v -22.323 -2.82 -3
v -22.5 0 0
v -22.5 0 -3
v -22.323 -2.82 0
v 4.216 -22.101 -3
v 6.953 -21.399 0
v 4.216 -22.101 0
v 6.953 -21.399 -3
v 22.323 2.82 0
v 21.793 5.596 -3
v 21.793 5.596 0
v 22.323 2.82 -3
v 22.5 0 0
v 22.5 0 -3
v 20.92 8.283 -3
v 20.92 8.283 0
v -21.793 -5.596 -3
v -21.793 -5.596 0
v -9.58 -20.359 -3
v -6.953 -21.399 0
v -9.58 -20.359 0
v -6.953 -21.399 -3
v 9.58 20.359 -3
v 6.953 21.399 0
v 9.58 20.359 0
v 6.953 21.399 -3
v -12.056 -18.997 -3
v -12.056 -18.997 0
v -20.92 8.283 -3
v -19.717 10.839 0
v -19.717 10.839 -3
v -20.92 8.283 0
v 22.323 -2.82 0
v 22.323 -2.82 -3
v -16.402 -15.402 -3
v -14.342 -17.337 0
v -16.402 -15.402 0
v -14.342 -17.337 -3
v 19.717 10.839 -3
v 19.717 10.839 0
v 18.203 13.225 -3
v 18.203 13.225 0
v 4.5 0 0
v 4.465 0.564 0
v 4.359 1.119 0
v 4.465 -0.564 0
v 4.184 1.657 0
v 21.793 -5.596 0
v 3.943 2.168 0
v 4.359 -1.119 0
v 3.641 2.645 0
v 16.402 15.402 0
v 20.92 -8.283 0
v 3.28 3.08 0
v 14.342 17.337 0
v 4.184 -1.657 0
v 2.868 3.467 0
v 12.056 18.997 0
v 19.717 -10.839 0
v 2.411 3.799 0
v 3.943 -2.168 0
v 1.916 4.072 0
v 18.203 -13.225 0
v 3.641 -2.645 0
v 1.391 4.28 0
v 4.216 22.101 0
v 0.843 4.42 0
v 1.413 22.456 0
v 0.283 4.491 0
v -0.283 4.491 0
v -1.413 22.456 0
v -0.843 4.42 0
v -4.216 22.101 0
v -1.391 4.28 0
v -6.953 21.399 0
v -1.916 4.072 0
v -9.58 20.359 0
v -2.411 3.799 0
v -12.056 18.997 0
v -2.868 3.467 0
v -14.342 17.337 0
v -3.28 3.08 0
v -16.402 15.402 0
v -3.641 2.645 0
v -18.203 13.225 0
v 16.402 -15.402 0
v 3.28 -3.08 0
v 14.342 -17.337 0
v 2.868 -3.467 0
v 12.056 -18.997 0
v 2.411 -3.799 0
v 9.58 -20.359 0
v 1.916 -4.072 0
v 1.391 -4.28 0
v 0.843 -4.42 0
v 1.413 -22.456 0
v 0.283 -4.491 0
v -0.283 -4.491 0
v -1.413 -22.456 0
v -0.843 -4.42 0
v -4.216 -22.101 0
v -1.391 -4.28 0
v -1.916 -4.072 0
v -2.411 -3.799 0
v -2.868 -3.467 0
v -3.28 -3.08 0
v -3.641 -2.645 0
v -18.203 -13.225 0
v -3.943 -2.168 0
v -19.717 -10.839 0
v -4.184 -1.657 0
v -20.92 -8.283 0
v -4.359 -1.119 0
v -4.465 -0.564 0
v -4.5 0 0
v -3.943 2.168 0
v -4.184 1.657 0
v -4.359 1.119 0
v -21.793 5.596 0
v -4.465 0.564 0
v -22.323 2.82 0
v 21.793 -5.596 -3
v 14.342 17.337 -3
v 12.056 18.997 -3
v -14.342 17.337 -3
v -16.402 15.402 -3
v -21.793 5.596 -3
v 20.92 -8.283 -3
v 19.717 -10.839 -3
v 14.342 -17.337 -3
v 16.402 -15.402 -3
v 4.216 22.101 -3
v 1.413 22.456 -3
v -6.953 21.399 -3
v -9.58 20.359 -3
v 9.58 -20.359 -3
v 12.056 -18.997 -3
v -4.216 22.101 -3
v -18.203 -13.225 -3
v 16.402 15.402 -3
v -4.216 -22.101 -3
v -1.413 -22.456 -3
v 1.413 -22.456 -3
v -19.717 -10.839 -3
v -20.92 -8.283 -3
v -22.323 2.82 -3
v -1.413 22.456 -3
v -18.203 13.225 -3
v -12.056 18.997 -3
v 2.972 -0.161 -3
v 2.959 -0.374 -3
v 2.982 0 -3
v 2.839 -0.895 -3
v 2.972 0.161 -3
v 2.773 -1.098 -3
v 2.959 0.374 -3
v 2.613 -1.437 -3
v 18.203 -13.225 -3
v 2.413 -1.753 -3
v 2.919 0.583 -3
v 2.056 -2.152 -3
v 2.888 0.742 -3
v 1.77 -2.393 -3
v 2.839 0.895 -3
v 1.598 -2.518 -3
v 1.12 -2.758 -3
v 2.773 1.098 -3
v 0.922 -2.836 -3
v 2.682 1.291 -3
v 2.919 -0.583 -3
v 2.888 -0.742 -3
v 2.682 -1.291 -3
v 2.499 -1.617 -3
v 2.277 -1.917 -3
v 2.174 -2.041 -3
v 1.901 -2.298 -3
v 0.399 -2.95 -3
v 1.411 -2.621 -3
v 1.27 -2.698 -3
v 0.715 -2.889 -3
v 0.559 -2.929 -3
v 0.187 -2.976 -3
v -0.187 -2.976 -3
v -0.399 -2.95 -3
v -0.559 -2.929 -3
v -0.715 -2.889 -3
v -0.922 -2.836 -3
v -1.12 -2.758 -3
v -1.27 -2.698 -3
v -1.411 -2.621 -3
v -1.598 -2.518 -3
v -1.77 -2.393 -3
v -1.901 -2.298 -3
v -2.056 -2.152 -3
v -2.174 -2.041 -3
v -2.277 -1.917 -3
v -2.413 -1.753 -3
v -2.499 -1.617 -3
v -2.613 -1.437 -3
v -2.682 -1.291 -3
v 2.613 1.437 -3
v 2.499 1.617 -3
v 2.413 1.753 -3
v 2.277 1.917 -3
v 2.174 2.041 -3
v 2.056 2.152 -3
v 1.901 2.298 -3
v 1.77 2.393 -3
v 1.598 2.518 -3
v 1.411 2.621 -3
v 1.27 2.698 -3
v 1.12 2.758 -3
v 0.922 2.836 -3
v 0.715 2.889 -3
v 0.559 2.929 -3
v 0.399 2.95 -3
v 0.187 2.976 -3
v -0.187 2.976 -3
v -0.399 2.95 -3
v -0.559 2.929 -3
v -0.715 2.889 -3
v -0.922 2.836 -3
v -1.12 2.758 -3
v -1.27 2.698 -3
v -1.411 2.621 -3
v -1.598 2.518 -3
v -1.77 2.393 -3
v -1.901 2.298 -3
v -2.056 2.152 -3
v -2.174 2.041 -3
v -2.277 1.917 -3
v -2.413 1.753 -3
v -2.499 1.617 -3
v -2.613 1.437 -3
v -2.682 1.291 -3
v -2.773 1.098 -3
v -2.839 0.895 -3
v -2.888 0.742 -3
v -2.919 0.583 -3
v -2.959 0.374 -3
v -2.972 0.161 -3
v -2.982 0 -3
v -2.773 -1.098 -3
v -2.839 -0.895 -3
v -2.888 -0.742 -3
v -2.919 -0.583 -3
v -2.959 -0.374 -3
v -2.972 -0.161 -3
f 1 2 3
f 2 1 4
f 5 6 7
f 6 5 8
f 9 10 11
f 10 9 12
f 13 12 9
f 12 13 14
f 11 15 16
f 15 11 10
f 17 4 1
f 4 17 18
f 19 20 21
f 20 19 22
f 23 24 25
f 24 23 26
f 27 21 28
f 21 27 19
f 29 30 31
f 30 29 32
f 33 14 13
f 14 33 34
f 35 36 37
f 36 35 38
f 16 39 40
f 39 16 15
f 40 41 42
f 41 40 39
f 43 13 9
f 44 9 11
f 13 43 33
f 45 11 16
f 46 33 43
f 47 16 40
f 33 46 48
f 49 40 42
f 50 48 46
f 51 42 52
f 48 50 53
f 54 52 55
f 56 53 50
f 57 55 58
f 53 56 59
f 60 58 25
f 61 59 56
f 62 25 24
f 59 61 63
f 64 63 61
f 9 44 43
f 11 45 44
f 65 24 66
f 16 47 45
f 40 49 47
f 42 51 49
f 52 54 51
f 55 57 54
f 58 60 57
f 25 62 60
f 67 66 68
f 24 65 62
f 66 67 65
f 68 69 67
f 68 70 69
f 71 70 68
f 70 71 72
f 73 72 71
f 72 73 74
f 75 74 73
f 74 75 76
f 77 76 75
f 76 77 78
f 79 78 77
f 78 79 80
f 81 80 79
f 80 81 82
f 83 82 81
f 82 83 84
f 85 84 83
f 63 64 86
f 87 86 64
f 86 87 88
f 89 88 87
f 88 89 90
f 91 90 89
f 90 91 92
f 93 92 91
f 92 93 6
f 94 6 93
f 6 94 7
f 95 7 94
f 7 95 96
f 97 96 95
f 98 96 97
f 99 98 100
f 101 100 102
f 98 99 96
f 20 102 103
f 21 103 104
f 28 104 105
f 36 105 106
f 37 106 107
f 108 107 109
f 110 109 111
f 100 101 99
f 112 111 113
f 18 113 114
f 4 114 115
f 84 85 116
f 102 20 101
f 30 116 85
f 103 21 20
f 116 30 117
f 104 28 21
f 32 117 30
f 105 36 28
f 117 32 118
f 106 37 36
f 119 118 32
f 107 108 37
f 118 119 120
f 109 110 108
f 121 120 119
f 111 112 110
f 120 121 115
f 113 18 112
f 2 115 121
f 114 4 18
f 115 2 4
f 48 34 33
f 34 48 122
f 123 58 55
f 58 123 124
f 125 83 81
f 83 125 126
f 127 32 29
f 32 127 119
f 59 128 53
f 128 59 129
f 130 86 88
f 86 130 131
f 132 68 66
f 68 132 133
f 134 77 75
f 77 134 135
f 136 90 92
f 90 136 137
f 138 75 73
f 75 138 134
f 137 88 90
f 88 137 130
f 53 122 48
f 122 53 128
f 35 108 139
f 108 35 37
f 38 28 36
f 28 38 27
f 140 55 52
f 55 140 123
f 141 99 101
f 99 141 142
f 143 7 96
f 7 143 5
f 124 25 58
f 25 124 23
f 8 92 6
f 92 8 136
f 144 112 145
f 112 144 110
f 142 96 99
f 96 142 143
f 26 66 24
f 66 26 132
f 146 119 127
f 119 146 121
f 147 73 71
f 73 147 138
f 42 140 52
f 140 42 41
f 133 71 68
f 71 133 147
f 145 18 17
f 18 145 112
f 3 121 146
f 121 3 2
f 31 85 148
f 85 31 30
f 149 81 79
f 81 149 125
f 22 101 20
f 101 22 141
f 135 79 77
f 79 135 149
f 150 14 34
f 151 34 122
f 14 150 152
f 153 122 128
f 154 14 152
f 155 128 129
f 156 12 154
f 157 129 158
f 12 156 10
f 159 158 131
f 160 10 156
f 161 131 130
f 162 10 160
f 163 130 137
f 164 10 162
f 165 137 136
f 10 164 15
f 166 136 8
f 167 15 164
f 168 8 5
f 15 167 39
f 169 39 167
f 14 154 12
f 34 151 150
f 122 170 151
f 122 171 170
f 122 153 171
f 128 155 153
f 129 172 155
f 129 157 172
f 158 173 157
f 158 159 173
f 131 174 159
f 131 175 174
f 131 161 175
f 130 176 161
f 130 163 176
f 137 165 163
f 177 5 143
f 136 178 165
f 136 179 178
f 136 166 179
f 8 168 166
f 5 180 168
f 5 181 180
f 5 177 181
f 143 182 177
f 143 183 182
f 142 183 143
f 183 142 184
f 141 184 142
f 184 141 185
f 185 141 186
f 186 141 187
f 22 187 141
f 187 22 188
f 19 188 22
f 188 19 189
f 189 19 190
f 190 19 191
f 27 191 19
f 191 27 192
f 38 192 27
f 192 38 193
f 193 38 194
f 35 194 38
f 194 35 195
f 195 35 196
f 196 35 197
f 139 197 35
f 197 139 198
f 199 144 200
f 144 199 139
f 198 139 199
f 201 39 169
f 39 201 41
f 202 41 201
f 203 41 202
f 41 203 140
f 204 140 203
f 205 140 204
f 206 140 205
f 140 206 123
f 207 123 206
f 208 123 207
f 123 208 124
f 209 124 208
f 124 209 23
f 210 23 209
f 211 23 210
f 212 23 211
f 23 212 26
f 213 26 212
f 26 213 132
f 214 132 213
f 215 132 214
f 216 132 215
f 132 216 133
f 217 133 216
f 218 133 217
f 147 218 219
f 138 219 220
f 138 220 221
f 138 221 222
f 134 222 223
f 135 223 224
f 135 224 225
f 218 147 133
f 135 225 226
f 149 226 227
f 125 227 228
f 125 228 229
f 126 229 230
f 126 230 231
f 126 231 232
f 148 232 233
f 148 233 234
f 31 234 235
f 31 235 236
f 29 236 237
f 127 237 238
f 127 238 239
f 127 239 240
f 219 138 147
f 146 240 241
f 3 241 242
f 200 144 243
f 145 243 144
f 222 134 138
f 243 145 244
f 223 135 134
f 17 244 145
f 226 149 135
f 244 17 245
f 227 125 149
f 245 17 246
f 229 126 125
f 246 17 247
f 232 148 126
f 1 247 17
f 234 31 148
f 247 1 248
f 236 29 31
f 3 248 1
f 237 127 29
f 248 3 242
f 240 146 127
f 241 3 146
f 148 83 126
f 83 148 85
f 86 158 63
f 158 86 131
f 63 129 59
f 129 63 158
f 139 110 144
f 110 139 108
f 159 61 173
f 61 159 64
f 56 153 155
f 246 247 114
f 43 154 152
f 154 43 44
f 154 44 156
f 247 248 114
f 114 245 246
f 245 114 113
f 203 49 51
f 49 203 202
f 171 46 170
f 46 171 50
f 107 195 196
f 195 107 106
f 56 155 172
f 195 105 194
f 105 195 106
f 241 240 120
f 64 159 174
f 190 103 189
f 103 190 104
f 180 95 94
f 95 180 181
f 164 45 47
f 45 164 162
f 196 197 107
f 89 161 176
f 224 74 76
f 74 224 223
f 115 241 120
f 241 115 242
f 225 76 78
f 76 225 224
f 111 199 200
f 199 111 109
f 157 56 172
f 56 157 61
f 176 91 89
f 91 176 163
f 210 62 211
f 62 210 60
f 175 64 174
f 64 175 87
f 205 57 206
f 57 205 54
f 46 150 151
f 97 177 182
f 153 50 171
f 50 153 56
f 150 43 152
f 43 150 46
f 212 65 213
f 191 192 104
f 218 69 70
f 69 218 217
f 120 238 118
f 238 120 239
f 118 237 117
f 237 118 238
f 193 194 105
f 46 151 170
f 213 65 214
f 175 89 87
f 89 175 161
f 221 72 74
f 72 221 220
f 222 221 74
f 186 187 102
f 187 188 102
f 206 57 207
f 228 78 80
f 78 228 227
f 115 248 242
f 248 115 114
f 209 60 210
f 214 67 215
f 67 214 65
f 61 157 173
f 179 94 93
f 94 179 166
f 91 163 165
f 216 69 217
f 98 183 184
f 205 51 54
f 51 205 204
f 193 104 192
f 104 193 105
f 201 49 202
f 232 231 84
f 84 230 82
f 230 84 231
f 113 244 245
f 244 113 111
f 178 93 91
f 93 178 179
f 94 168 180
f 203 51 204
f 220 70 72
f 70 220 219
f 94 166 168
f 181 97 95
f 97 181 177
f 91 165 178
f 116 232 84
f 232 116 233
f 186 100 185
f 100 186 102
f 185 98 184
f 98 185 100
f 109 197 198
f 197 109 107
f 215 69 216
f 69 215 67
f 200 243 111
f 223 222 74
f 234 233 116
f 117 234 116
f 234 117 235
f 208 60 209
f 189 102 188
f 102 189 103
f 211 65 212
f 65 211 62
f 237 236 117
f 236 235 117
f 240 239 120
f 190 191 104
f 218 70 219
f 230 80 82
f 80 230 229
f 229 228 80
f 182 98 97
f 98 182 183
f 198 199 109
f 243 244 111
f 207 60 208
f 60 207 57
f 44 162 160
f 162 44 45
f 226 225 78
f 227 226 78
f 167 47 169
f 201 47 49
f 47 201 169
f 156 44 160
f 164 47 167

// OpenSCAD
$fn = 50;


difference() {
	union() {
		translate(v = [0, 0, -3.0000000000]) {
			cylinder(h = 3, r = 22.5000000000);
		}
		translate(v = [0, 0, -3.0000000000]) {
			cylinder(h = 3, r = 2.8750000000);
		}
	}
	union() {
		translate(v = [0, 0, 0]) {
			rotate(a = [0, 0, 0]) {
				difference() {
					union() {
						translate(v = [0, 0, -3.0000000000]) {
							cylinder(h = 3, r = 2.2500000000);
						}
						translate(v = [0, 0, -4.2000000000]) {
							cylinder(h = 4.2000000000, r1 = 2.3750000000, r2 = 4.5000000000);
						}
						translate(v = [0, 0, -3.0000000000]) {
							cylinder(h = 3, r = 2.3750000000);
						}
						translate(v = [0, 0, -3.0000000000]) {
							cylinder(h = 3, r = 2.2500000000);
						}
					}
					union();
				}
			}
		}
	}
}
